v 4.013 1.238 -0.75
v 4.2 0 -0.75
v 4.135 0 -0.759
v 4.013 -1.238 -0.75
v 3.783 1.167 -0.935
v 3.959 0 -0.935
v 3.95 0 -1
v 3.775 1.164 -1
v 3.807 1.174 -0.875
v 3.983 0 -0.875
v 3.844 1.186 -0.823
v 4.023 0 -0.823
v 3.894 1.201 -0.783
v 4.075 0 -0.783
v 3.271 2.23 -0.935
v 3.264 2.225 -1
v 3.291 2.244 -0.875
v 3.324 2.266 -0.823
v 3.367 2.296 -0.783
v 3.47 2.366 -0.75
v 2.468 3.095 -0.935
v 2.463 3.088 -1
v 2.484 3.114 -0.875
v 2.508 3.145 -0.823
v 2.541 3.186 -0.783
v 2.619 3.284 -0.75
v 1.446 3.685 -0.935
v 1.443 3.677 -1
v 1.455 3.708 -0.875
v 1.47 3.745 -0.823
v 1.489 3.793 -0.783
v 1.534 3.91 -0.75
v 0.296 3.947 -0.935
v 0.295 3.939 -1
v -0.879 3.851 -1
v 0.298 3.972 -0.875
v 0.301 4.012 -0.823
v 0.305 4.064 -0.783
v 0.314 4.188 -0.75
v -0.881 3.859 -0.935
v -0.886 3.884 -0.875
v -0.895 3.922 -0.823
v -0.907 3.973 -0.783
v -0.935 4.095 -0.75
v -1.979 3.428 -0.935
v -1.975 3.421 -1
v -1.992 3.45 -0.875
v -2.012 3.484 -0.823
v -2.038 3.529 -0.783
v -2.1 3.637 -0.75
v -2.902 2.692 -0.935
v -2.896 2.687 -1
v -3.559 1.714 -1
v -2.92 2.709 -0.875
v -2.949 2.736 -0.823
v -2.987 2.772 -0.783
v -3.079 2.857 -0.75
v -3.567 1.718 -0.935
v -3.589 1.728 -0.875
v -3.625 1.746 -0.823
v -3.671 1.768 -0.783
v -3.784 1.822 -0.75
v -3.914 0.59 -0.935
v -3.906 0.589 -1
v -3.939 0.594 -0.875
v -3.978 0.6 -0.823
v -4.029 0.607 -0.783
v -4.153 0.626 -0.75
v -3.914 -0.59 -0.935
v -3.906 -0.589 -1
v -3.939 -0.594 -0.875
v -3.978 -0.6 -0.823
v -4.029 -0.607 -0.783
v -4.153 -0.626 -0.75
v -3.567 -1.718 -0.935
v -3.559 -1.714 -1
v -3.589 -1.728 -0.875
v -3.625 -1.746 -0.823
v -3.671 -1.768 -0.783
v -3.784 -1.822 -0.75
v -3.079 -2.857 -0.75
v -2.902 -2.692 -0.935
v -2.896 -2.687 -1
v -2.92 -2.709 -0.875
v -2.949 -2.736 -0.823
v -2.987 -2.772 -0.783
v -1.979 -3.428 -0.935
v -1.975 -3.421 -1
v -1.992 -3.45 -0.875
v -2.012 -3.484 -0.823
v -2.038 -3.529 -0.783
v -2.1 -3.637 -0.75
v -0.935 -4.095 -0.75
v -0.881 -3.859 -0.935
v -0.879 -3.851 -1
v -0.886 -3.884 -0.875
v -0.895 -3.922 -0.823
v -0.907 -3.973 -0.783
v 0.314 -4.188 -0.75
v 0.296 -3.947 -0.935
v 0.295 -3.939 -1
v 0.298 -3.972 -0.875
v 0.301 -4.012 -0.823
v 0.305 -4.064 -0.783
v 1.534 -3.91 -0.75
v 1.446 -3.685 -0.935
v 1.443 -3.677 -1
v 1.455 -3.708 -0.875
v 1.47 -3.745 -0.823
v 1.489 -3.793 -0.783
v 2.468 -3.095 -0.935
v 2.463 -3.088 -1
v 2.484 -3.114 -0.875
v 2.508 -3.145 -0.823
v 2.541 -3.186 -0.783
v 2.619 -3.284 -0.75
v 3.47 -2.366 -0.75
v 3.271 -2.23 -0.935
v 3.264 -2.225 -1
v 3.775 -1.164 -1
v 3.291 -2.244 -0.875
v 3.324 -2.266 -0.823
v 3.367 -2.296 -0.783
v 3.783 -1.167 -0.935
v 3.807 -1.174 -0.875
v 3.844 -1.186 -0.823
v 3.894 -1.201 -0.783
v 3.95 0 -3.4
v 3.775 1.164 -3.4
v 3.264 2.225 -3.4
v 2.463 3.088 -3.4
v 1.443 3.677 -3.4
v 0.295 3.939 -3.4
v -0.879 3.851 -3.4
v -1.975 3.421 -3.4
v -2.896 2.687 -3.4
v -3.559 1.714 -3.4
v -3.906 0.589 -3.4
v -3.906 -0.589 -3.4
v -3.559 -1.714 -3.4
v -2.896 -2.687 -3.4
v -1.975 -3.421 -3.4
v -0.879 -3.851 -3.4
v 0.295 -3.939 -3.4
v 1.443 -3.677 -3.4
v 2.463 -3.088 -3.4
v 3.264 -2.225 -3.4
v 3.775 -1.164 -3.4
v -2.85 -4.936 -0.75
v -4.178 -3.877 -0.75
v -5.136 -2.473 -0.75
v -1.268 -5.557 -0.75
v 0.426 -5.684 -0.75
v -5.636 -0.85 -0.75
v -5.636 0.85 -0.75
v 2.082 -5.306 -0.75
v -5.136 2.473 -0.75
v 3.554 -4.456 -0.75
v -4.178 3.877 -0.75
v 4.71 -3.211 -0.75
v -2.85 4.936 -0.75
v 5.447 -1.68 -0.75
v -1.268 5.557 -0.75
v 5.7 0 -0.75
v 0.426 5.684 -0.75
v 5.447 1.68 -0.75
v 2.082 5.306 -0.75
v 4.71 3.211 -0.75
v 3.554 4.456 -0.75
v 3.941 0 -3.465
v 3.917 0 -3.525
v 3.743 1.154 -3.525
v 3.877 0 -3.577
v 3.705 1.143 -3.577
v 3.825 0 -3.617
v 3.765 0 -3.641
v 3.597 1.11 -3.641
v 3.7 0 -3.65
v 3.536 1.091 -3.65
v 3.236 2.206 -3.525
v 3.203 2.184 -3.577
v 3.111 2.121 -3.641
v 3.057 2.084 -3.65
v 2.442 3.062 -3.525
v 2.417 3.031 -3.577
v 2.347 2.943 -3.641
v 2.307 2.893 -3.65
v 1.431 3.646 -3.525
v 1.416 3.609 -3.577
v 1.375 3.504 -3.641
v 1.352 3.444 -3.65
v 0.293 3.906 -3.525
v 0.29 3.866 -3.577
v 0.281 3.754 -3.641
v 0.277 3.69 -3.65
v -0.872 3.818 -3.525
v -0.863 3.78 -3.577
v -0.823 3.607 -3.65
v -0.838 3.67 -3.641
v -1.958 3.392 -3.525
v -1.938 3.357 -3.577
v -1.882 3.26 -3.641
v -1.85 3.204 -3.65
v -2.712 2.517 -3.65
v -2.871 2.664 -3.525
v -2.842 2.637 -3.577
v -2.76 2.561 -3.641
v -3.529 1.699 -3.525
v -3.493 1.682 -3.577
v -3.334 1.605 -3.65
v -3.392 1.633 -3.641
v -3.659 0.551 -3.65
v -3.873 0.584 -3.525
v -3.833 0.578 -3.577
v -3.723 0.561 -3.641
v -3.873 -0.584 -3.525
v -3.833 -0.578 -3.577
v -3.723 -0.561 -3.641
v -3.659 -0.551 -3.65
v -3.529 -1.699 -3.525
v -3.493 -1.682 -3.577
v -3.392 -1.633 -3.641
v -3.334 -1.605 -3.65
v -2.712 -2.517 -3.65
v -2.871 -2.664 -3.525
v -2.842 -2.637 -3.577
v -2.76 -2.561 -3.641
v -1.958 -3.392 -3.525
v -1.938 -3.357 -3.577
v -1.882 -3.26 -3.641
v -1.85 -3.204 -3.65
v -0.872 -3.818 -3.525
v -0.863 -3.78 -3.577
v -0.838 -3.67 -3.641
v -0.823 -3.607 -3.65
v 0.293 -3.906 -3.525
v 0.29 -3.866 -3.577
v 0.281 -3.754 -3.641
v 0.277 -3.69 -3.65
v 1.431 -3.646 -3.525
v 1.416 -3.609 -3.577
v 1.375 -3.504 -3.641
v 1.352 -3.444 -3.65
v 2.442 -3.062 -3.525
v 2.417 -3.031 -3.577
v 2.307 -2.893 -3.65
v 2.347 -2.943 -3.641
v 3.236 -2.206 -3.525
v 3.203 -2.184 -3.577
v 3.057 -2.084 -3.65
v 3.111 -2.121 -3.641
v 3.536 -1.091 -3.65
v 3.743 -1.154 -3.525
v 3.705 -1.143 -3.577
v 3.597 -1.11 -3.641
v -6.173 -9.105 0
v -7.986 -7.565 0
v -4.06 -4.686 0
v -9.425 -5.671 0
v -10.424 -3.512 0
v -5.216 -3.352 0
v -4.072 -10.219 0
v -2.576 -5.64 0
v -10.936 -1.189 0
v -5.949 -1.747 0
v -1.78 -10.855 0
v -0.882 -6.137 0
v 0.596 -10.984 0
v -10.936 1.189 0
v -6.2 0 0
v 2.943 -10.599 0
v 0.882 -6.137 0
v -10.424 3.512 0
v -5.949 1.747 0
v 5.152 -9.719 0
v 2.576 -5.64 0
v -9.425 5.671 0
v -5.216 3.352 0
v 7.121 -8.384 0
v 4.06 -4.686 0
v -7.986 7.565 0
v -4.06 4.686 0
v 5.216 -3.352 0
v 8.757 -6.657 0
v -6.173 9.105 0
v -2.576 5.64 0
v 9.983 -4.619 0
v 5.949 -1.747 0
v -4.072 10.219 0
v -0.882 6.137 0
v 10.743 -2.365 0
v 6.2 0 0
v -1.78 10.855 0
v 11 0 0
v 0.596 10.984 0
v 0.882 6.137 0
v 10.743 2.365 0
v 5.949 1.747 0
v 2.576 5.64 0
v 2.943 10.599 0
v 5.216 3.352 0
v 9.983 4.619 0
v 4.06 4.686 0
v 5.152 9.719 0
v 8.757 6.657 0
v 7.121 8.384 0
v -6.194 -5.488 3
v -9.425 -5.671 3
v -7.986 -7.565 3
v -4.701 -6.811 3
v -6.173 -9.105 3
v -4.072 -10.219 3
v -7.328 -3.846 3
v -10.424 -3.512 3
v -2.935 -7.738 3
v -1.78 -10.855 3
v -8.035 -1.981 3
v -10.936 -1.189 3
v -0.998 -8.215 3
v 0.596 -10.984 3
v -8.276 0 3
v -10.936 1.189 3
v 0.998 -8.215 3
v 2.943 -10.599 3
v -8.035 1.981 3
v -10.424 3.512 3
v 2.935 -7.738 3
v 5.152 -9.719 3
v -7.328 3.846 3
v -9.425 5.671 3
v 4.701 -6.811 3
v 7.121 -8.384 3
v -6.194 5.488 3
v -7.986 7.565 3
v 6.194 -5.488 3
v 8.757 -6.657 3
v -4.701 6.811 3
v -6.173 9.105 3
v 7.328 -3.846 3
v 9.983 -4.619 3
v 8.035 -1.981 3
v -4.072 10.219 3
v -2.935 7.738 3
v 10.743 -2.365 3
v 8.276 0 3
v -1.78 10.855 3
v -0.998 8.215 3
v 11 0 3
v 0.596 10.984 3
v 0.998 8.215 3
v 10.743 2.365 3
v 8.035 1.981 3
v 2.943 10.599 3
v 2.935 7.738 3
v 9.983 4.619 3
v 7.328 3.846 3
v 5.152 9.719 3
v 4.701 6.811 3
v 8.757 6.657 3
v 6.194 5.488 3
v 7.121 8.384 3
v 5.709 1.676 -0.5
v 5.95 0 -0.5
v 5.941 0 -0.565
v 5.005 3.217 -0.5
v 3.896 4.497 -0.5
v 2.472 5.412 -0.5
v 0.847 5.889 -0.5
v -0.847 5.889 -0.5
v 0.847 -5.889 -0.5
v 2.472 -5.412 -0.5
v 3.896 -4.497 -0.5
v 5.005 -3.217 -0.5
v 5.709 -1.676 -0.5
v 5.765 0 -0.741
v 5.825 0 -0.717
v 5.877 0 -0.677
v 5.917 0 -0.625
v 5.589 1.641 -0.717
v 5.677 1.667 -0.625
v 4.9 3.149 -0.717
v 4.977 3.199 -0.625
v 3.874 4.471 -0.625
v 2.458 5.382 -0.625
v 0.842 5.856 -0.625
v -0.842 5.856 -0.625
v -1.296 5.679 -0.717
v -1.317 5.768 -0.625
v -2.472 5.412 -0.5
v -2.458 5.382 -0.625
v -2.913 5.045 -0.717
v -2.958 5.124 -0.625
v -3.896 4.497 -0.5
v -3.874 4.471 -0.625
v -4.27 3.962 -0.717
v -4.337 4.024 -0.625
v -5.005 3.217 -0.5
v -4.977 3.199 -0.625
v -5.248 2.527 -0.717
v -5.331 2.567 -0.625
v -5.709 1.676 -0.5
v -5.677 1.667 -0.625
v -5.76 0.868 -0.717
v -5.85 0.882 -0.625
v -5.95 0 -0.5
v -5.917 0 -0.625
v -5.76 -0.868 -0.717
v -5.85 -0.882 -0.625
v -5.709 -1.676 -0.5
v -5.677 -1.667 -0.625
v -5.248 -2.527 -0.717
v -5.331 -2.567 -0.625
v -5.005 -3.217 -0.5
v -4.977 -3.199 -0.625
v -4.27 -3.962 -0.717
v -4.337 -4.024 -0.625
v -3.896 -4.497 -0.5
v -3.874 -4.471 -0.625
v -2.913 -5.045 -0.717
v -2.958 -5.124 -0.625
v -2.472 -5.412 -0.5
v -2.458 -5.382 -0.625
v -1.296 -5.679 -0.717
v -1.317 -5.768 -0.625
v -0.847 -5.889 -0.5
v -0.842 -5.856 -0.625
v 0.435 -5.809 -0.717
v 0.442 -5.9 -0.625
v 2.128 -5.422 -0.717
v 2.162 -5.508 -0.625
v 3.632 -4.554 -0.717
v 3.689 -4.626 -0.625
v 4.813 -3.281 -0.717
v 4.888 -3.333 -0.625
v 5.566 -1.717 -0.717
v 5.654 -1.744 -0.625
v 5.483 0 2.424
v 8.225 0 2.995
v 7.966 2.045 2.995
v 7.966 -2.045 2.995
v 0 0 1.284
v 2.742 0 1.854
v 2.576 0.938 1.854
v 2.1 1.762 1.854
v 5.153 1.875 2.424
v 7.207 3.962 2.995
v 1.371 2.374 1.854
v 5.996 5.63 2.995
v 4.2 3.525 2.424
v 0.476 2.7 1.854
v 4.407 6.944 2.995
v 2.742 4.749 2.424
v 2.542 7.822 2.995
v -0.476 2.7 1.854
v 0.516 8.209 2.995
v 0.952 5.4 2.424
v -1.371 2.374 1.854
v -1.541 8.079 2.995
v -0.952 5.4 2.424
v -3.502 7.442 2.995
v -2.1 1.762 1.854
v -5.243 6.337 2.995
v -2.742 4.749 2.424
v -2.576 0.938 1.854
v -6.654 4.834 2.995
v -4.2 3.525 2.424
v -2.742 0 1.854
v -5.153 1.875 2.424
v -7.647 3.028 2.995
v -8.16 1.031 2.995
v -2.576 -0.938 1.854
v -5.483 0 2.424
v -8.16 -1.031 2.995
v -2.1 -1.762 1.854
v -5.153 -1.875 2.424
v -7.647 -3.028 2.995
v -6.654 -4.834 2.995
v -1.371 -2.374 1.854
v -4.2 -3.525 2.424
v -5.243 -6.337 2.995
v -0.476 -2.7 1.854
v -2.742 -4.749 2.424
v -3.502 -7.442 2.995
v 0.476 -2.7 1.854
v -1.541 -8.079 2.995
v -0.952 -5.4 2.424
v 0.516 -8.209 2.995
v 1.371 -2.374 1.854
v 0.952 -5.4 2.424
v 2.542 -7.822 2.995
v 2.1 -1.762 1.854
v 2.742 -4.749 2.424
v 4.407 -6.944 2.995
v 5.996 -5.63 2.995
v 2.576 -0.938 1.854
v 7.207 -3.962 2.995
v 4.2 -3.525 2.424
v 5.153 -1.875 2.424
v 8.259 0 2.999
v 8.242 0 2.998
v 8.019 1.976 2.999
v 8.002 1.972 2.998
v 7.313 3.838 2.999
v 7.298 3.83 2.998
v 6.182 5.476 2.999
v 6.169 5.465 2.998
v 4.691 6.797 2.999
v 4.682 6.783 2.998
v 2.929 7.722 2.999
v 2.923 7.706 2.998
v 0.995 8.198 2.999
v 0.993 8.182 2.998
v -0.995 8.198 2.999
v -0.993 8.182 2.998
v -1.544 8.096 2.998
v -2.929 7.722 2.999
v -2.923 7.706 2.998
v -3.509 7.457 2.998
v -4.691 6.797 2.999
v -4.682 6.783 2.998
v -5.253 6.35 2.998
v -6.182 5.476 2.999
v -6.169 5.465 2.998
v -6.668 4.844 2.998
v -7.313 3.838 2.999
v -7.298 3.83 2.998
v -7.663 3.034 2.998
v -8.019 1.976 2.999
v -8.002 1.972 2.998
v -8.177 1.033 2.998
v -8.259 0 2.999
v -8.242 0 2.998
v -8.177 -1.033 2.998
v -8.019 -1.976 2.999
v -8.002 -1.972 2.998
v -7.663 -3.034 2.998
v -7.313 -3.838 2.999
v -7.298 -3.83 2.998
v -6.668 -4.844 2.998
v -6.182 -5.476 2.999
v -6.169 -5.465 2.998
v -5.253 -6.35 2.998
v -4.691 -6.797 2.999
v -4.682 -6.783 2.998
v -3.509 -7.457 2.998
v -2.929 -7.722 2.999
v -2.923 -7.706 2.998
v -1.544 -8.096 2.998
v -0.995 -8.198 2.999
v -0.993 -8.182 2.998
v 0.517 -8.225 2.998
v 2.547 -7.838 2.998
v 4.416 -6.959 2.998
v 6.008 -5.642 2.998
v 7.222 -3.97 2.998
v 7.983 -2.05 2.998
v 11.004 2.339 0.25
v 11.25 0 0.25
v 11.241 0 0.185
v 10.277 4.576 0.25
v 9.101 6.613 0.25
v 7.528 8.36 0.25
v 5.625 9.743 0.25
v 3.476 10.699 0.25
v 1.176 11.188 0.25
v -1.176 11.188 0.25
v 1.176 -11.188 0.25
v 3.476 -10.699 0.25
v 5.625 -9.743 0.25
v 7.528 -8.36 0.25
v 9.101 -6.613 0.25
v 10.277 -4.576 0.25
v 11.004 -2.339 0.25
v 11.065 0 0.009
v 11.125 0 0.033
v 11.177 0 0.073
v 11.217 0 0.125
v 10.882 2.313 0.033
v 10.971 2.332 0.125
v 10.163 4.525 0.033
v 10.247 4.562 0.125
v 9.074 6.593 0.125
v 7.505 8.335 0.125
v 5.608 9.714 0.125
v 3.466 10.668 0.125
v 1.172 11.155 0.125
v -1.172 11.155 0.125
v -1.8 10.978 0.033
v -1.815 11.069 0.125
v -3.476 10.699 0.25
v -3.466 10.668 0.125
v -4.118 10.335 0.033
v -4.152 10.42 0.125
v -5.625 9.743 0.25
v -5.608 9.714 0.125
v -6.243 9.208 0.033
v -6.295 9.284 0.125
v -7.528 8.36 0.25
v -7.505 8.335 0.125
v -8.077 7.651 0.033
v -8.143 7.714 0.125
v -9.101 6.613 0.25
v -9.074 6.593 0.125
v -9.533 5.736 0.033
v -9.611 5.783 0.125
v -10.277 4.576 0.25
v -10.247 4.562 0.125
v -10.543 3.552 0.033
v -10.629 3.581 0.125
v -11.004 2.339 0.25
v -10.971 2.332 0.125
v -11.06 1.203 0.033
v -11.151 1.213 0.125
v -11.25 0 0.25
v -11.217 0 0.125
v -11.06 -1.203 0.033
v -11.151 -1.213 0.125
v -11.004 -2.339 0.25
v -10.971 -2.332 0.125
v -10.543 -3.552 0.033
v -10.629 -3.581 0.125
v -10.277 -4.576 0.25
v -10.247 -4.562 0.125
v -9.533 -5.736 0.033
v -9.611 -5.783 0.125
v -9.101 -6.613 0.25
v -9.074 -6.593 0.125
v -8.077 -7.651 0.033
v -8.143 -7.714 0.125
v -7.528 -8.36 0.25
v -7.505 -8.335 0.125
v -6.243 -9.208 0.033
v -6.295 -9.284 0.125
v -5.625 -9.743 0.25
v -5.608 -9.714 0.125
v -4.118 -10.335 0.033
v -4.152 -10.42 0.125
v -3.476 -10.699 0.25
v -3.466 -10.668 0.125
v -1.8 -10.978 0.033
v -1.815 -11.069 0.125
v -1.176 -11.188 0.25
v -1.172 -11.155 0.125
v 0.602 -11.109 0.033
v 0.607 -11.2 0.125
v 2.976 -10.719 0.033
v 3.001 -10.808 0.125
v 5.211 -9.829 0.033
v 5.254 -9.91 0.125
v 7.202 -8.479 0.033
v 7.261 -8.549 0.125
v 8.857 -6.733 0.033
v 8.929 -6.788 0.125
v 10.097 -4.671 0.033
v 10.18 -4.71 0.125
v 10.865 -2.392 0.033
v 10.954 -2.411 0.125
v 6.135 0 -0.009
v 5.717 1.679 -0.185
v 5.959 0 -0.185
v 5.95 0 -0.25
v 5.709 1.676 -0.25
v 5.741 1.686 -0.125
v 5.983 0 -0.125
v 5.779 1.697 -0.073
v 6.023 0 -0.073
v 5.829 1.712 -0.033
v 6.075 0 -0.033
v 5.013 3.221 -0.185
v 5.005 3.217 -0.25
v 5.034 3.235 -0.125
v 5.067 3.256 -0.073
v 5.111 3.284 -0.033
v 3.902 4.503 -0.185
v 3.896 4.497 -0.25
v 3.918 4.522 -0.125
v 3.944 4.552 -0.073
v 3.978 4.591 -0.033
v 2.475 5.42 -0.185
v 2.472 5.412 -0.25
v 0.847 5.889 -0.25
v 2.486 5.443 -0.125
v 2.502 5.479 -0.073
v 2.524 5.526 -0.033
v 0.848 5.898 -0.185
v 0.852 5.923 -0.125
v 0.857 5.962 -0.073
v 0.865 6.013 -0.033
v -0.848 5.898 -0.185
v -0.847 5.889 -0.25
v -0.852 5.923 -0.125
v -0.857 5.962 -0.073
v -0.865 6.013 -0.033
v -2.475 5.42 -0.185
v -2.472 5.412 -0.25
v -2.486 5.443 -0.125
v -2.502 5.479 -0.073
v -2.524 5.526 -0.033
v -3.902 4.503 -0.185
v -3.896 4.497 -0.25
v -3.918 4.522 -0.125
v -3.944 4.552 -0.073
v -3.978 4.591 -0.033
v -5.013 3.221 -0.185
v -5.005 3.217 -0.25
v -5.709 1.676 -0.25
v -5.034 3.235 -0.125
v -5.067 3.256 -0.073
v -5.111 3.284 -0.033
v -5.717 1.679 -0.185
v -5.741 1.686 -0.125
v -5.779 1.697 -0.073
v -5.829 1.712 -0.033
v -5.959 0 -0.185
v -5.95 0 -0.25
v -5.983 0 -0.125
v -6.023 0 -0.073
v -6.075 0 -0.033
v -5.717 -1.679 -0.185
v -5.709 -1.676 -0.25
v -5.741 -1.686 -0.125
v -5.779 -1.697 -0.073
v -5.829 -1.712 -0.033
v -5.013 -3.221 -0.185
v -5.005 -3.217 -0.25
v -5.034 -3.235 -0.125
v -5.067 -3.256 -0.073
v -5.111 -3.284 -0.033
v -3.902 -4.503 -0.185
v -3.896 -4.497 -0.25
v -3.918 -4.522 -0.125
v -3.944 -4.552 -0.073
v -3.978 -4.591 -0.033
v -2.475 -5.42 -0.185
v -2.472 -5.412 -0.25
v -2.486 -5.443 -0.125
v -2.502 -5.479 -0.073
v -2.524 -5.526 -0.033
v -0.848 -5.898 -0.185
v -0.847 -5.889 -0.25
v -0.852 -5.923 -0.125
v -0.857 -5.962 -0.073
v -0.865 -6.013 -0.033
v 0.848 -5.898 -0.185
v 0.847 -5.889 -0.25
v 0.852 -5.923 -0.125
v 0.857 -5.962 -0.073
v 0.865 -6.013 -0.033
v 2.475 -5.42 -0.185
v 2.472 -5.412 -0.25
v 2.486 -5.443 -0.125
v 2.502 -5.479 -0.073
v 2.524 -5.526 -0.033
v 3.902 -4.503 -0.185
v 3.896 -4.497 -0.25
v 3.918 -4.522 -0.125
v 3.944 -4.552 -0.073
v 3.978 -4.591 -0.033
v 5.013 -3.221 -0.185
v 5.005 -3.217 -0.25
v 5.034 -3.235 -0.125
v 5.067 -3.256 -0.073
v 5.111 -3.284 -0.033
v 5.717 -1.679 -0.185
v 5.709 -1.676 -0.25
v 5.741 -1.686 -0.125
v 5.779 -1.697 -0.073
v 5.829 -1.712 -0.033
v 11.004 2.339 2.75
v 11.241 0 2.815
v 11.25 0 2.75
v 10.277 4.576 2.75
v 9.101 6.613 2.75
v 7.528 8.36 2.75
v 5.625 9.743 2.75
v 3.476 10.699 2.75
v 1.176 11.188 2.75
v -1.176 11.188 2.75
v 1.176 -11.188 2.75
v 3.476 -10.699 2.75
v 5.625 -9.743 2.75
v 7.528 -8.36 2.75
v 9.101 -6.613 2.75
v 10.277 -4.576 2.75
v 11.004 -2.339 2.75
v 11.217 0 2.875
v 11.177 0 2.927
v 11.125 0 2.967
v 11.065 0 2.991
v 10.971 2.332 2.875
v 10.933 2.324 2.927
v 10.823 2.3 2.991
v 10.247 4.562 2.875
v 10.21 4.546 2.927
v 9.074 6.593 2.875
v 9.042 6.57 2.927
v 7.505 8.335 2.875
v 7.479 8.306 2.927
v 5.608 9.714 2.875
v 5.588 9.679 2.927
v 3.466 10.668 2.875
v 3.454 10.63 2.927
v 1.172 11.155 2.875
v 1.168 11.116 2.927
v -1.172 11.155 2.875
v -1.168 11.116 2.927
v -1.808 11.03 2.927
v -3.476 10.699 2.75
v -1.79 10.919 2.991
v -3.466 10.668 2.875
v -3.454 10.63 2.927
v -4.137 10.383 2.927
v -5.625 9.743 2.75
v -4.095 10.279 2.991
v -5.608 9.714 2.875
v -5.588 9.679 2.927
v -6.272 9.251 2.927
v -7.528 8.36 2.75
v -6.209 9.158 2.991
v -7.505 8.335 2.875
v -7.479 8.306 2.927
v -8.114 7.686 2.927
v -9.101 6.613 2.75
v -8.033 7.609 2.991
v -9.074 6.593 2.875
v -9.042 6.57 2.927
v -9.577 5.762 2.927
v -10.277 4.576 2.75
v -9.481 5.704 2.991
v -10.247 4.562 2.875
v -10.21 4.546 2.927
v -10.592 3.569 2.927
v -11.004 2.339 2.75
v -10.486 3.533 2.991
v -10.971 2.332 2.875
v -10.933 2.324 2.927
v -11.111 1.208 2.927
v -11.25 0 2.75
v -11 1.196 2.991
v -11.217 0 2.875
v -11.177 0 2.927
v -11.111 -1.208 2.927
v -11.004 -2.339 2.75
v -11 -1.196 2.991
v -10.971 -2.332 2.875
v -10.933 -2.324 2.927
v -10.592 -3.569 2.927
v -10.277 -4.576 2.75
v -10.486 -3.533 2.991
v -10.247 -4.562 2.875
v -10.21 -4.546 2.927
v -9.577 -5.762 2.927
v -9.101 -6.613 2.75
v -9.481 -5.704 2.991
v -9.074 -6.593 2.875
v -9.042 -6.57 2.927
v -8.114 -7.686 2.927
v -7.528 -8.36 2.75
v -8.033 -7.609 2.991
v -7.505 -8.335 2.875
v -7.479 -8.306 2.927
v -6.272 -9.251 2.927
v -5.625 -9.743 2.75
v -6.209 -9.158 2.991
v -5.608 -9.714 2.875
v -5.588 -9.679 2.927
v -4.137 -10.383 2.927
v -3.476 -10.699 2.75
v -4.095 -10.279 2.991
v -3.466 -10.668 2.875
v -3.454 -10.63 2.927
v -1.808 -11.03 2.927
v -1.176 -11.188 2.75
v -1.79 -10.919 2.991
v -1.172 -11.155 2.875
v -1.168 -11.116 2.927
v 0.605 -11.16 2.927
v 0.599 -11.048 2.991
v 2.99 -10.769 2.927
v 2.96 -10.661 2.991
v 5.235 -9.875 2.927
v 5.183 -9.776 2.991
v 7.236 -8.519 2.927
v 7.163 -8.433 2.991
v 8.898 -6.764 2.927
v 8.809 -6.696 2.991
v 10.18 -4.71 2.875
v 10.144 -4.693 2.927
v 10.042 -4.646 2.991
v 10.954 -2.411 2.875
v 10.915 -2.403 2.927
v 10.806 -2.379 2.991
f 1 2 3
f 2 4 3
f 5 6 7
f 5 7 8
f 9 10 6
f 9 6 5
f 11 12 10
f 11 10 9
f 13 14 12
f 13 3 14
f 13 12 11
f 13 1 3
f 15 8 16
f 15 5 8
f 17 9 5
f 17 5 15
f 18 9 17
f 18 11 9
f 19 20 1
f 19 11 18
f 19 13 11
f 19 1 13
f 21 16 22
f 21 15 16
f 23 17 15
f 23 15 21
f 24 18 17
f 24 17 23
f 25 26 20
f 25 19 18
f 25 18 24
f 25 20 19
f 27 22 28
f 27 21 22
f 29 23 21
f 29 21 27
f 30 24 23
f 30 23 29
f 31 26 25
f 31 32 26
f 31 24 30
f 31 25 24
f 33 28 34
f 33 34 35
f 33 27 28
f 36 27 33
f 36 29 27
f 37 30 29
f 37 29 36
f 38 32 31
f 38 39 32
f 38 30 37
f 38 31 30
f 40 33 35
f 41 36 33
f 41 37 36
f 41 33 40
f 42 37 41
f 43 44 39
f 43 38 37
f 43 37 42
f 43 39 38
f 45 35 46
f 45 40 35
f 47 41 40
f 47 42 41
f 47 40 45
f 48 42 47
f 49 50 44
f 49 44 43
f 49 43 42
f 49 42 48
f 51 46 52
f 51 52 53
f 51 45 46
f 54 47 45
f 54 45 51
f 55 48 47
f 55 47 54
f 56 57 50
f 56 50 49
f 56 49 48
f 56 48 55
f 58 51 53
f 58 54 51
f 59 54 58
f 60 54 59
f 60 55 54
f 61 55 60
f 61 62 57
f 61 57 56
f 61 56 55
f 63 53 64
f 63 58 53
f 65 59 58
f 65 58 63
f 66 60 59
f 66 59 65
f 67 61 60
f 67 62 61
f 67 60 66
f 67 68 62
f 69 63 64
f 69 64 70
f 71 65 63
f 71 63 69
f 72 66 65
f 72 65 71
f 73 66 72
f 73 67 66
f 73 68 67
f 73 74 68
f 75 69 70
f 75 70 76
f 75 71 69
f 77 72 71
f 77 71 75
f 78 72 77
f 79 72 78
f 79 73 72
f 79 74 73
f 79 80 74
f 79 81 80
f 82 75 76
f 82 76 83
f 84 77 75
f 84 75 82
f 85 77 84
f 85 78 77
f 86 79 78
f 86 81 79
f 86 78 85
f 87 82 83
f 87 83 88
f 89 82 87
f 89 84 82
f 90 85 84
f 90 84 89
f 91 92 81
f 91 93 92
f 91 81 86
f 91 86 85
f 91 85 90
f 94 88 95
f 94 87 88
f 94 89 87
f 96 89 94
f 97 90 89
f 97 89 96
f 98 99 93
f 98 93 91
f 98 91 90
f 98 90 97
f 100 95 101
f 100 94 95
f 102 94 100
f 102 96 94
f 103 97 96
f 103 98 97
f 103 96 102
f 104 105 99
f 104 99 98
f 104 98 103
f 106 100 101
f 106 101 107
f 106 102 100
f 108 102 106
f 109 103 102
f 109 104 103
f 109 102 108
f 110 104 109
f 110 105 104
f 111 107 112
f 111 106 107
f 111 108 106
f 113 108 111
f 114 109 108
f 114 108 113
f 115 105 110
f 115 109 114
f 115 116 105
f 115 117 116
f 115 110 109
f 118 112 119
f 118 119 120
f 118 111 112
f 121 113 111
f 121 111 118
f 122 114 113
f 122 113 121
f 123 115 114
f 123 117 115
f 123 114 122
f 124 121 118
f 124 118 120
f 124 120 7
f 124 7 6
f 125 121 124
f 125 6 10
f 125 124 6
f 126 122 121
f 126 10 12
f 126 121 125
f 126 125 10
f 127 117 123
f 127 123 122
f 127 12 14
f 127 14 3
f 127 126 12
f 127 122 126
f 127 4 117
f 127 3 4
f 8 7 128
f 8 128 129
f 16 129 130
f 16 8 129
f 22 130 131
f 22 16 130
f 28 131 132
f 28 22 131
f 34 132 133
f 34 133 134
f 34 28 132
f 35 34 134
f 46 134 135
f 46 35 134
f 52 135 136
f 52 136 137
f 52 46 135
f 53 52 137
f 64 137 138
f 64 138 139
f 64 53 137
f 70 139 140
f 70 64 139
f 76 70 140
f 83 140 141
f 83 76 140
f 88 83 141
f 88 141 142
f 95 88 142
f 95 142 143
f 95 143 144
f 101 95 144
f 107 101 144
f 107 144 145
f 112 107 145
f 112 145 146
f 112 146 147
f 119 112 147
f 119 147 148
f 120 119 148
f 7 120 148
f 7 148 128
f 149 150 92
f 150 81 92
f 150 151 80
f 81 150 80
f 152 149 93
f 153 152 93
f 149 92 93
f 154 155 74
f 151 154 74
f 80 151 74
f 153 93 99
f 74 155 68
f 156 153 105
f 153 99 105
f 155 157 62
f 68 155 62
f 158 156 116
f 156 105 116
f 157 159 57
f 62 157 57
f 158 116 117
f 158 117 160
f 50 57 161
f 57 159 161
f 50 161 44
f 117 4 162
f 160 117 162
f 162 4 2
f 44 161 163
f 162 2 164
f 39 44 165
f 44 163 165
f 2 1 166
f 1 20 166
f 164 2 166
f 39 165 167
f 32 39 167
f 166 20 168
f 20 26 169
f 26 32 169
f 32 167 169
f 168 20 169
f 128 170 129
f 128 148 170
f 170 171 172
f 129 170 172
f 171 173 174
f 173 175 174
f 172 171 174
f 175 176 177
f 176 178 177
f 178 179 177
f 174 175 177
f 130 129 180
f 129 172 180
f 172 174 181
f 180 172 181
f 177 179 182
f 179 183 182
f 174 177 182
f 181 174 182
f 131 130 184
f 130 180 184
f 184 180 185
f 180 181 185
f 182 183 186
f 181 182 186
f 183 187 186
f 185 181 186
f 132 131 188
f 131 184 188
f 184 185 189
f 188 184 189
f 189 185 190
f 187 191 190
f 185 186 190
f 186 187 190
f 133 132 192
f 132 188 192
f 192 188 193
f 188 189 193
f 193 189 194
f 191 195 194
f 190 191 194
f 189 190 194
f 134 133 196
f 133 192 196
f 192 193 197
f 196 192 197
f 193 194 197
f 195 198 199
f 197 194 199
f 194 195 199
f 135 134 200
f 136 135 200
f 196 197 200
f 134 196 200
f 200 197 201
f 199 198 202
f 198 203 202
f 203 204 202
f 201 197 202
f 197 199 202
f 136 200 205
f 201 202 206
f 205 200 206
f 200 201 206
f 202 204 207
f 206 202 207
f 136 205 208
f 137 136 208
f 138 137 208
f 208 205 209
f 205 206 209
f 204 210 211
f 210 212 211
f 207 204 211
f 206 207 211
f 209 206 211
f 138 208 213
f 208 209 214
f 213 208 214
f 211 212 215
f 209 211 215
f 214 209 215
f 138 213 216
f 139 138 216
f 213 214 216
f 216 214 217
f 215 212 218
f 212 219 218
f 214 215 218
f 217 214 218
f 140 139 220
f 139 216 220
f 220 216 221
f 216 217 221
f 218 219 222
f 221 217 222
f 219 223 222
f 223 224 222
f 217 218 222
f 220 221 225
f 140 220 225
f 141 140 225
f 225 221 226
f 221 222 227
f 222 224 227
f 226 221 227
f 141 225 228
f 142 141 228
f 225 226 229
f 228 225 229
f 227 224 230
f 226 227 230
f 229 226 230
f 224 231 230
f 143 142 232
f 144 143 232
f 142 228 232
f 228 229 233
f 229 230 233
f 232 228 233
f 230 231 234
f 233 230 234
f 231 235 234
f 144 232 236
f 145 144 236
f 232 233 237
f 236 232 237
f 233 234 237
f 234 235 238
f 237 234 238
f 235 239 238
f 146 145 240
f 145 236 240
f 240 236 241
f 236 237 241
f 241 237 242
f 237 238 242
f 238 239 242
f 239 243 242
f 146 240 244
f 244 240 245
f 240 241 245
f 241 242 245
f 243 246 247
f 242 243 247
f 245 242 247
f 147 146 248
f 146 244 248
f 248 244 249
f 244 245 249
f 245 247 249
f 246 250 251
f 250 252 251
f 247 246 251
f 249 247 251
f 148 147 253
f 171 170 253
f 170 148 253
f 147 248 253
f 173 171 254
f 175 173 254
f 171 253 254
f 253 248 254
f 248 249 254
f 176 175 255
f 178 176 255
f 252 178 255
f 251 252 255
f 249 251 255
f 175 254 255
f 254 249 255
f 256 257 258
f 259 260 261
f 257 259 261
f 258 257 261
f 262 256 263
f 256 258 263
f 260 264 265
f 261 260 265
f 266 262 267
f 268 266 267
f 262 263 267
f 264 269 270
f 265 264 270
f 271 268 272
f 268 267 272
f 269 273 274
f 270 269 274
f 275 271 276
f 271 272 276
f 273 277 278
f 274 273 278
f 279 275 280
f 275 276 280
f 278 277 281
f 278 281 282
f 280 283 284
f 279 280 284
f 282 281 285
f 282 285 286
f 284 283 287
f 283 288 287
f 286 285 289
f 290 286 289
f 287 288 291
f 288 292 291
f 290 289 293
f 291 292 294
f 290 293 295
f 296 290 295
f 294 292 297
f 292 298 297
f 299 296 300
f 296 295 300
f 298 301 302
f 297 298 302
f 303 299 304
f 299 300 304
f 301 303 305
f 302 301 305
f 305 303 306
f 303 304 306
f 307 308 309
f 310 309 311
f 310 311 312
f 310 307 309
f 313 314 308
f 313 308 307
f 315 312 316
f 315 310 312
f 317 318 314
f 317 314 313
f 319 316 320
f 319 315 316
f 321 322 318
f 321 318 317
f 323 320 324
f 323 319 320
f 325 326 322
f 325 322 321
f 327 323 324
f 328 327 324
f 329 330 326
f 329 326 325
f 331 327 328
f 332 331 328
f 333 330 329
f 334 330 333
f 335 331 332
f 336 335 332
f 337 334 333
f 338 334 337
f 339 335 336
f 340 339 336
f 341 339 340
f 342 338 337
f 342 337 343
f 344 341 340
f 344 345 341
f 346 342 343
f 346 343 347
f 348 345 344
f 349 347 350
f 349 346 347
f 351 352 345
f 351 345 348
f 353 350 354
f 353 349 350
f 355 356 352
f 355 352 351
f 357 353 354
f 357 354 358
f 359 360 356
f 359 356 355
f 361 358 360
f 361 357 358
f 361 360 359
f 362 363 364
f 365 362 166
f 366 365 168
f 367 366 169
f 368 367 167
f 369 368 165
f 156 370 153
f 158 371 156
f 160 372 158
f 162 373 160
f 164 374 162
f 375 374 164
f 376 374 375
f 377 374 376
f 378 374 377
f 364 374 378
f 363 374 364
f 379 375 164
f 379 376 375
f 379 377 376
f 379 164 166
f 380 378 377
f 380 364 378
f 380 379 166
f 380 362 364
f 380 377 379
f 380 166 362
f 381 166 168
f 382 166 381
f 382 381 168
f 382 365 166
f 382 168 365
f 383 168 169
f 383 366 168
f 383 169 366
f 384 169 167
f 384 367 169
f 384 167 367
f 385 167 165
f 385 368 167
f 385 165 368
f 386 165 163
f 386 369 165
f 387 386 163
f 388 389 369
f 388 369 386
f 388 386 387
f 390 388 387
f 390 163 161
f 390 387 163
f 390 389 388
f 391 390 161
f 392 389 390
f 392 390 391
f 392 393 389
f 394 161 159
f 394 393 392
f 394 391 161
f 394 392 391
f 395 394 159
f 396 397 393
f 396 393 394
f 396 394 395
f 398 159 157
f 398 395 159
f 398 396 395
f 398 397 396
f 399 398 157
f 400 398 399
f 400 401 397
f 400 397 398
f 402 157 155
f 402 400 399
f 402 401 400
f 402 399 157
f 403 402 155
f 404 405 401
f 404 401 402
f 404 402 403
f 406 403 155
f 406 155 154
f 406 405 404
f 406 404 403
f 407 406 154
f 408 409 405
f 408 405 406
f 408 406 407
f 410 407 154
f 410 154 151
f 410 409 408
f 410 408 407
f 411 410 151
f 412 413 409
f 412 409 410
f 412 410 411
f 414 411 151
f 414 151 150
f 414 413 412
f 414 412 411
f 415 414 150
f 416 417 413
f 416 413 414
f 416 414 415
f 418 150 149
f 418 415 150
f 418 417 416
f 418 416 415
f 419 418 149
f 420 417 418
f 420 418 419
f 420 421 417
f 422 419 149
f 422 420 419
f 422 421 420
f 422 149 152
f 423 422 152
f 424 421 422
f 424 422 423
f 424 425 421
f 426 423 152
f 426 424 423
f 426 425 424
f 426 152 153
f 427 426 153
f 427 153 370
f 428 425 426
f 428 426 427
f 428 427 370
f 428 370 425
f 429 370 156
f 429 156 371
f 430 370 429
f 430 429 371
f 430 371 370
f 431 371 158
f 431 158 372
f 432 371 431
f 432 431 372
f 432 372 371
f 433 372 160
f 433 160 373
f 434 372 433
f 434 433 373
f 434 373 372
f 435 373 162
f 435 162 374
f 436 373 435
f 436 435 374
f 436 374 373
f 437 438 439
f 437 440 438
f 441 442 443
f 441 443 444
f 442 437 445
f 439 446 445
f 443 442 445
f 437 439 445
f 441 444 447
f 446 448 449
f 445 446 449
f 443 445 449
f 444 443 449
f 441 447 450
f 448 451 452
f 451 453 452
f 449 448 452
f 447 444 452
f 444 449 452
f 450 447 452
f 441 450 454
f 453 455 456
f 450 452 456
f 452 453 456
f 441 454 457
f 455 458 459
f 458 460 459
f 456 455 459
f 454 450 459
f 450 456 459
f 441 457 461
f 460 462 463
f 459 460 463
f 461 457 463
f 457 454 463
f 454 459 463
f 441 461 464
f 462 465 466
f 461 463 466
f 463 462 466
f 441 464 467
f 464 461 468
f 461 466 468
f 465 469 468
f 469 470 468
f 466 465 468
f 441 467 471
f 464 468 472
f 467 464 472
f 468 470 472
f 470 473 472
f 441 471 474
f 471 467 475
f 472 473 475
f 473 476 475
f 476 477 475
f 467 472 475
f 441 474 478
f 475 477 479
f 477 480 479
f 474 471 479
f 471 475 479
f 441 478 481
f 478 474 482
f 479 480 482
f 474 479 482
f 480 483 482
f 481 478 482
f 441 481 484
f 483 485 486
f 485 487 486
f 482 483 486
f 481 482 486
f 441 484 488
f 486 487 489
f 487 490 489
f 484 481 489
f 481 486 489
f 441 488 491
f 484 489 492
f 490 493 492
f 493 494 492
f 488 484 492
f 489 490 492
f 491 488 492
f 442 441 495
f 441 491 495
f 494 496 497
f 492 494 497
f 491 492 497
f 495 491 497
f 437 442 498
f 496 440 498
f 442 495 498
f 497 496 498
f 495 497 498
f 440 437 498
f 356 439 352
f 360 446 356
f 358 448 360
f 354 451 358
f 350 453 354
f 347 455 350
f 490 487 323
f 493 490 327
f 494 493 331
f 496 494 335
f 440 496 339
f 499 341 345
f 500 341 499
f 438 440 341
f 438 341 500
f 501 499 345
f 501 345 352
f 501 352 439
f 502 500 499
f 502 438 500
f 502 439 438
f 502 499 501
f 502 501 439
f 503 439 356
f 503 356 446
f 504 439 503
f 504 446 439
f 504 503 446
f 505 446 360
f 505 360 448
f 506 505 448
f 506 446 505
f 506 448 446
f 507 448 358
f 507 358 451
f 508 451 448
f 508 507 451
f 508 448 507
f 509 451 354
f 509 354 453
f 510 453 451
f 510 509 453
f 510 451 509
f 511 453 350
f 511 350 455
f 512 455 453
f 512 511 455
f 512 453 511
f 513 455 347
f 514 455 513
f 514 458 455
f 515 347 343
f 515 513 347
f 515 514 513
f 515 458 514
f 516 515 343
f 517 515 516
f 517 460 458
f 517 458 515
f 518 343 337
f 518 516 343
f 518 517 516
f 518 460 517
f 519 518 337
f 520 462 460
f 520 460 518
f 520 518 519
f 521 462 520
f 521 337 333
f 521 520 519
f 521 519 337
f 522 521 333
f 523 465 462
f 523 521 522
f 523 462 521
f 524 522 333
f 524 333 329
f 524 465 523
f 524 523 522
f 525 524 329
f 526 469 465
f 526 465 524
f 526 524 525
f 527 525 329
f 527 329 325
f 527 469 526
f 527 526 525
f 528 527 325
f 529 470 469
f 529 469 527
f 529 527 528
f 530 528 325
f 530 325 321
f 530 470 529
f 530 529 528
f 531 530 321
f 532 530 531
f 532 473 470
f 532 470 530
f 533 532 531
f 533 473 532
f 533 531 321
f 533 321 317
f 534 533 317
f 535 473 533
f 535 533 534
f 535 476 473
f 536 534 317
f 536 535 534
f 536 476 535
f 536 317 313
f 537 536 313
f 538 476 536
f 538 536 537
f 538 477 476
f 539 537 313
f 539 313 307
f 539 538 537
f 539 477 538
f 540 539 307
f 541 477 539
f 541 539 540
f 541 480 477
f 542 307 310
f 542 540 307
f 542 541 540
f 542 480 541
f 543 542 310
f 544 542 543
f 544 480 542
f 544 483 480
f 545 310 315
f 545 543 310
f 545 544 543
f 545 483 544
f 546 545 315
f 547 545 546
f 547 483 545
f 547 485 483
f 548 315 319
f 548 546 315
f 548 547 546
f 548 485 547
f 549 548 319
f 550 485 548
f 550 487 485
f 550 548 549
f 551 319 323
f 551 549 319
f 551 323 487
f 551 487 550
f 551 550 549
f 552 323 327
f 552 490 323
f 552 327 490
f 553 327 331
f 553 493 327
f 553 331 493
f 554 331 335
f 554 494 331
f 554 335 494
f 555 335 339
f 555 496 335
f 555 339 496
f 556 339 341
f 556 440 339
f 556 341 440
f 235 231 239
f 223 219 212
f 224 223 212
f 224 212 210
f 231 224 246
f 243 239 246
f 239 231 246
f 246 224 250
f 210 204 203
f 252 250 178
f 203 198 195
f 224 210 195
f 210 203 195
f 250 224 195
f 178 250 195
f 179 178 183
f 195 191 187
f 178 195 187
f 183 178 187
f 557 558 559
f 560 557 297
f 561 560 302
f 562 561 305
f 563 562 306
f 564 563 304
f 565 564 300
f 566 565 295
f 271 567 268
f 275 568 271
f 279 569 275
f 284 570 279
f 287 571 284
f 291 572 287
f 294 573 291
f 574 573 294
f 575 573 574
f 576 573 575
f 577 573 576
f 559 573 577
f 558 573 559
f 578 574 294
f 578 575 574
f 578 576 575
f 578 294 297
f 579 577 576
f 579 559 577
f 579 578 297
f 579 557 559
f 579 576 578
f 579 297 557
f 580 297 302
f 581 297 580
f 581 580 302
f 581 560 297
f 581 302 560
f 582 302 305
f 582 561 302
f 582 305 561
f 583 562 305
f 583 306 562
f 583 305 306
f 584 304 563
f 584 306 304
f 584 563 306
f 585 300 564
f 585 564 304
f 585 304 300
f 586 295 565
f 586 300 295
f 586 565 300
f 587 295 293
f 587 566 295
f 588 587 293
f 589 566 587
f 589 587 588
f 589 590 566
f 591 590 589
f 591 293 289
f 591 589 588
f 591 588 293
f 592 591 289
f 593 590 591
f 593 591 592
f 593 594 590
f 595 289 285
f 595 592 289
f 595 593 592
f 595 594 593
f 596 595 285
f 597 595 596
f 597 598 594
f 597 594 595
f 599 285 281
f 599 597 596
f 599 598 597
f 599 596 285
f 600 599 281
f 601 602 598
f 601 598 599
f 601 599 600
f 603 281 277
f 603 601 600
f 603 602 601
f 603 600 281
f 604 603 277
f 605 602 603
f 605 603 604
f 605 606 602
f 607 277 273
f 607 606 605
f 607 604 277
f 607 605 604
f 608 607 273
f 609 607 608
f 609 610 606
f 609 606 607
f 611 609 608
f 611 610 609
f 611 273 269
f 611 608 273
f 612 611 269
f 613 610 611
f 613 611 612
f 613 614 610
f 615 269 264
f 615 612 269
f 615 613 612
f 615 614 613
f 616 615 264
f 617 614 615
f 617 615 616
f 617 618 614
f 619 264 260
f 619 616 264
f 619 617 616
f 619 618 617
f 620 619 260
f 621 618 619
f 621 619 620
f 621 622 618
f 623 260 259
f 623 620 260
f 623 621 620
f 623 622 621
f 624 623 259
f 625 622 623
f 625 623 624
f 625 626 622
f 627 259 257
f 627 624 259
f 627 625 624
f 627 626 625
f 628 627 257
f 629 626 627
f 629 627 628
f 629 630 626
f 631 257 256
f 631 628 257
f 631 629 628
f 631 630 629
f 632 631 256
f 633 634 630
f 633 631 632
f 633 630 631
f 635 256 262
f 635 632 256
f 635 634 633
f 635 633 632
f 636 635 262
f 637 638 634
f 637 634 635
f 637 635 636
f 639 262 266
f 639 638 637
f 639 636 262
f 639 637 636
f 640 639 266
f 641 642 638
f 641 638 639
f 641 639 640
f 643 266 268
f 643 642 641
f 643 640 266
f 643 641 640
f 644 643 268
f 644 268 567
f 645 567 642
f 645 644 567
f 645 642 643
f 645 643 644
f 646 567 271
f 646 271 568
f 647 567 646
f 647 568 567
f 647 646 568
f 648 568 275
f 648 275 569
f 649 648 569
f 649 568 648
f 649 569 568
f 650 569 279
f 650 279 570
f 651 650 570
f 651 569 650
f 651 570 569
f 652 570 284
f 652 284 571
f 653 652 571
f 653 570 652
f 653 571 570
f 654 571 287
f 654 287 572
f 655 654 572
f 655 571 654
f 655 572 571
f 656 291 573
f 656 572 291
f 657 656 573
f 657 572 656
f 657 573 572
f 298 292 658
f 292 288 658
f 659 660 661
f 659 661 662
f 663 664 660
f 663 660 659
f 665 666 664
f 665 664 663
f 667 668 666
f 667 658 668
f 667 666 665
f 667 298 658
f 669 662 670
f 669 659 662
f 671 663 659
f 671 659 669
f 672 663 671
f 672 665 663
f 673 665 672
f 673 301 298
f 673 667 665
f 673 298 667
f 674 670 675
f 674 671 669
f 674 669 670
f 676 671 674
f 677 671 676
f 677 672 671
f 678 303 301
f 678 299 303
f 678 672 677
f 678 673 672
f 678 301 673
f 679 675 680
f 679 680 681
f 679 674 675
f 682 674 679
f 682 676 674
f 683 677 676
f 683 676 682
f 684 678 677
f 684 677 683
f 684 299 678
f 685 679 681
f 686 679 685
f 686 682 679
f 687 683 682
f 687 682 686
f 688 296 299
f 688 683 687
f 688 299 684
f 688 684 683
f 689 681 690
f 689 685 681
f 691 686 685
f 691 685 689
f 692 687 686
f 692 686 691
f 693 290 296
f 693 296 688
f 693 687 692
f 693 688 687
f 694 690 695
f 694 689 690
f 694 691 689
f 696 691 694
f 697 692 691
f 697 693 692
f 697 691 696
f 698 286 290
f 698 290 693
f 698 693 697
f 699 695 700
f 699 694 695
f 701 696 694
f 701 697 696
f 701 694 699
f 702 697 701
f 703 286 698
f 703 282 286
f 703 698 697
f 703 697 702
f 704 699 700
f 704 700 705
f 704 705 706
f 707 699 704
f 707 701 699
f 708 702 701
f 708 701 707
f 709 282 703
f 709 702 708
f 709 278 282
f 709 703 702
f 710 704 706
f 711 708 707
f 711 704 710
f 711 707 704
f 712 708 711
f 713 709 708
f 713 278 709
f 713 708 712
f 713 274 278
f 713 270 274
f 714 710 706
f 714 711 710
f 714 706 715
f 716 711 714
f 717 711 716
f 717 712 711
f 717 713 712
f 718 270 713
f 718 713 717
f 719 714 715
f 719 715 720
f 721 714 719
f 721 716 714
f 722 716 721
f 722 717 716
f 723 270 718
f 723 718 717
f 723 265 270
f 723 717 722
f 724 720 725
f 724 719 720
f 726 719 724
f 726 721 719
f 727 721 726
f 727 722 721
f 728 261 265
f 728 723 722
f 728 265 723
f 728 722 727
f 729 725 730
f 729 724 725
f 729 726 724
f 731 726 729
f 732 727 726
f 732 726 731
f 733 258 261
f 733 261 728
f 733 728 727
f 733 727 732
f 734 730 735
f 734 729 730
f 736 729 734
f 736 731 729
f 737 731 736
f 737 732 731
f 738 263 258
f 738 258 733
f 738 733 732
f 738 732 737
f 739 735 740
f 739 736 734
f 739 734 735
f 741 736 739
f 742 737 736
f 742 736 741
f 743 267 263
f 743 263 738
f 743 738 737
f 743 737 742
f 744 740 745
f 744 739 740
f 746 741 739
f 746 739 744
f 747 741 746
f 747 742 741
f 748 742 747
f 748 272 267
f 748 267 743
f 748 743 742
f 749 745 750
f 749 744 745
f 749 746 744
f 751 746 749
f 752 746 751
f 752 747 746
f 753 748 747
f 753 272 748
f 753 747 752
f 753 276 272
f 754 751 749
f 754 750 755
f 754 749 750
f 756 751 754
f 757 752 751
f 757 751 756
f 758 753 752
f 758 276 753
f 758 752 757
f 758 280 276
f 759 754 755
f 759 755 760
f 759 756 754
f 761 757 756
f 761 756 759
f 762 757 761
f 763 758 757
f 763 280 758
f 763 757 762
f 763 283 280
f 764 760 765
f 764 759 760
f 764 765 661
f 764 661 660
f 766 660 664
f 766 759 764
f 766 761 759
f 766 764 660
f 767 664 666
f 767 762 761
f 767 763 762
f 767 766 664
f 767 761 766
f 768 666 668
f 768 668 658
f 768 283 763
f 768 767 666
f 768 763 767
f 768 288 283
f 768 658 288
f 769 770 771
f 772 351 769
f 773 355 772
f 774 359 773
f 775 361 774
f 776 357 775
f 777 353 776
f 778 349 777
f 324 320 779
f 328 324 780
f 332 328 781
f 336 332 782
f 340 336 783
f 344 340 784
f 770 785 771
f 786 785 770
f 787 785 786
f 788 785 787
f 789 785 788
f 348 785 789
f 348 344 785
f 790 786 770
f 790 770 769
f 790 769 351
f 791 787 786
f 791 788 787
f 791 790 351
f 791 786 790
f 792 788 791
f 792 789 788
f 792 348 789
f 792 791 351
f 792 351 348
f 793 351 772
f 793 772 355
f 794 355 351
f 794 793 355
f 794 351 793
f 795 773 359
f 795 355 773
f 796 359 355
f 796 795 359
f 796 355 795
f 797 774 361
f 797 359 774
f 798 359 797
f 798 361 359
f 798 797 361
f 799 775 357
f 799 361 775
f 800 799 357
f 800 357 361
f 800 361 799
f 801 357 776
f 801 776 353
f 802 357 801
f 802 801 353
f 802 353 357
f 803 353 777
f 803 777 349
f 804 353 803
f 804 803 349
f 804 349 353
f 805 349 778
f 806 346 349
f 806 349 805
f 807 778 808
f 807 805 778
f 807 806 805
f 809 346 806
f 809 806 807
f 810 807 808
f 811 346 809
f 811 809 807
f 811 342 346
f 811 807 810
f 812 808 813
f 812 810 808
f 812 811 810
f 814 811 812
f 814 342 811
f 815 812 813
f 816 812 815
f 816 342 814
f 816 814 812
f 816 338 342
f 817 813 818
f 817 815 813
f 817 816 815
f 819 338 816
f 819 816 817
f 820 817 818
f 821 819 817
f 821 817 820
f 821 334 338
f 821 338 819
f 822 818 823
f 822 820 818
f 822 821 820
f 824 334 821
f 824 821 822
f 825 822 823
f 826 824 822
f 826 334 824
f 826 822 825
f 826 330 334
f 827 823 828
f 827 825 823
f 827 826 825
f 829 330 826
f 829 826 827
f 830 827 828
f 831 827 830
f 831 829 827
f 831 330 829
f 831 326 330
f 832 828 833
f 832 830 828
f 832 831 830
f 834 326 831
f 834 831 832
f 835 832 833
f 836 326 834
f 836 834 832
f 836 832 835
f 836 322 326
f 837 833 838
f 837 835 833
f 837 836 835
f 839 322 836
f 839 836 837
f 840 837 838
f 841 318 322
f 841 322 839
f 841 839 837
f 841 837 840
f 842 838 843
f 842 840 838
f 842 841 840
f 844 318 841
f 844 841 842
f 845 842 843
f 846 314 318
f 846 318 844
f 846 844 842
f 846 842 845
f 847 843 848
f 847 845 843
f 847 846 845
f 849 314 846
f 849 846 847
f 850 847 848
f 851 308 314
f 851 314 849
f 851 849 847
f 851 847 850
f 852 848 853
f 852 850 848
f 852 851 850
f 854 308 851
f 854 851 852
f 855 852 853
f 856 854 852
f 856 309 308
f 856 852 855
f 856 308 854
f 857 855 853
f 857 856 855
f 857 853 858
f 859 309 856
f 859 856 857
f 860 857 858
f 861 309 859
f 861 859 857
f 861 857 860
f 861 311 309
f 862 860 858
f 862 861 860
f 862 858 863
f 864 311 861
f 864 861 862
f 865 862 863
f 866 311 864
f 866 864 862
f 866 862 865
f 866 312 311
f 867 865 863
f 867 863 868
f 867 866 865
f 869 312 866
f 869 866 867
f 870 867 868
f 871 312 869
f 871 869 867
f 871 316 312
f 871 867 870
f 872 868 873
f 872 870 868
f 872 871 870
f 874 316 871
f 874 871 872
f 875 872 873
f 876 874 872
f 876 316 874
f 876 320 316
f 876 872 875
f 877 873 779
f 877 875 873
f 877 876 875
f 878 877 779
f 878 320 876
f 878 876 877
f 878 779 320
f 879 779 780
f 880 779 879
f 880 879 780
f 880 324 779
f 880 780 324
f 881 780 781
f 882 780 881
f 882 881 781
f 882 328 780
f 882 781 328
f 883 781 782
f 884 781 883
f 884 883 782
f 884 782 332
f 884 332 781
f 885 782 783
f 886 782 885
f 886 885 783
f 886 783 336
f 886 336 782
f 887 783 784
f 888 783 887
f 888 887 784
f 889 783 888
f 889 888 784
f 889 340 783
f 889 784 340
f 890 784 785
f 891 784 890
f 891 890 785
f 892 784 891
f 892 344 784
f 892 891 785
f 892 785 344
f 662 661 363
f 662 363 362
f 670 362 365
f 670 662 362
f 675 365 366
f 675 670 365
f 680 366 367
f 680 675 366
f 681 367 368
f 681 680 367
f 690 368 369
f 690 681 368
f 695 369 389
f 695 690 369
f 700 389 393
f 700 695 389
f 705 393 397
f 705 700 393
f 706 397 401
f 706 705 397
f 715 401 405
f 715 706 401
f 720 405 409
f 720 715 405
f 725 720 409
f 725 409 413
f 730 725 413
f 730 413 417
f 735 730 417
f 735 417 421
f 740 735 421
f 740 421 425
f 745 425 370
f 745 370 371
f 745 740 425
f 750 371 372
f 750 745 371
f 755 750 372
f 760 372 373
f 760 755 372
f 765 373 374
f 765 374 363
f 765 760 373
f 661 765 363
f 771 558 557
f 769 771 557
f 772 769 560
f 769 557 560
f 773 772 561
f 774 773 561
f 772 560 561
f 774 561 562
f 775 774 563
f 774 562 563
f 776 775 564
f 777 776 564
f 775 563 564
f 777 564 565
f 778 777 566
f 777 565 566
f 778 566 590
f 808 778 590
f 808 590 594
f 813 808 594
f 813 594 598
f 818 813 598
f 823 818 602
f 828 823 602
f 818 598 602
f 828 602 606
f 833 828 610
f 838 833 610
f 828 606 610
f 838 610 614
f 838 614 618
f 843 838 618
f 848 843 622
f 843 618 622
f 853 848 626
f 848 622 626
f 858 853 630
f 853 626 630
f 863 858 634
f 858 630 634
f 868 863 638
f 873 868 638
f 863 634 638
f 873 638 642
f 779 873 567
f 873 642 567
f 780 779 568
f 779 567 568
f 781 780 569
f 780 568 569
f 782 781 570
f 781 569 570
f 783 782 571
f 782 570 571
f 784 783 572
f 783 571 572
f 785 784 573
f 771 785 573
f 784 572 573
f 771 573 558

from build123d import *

# Parameters (mm, degrees)
F0_R     = 11.25
F0_R_2   = 8.25
F0_R_3   = 5.95
F0_R_4   = 3.95
F1_DEPTH = 3
F2_DEPTH = 0.75
F3_DEPTH = 3.65
F6_R     = 0.25


with BuildPart() as f1:
    # F0 (on Top) → F1 (new body)
    with BuildSketch(Plane.XY):
        Circle(F0_R)
        Circle(F0_R_2, mode=Mode.SUBTRACT)
        Circle(F0_R_2)
        Circle(F0_R_3, mode=Mode.SUBTRACT)
        Circle(F0_R_3)
        Circle(F0_R_4, mode=Mode.SUBTRACT)
        Circle(F0_R_4)
    extrude(amount=F1_DEPTH)

    # F0 (on Top) → F2 (join)
    with BuildSketch(Plane.XY):
        Circle(F0_R_3)
        Circle(F0_R_4, mode=Mode.SUBTRACT)
        Circle(F0_R_4)
    extrude(amount=-F2_DEPTH)

    # F0 (on Top) → F3 (join)
    with BuildSketch(Plane.XY):
        Circle(F0_R_4)
    extrude(amount=-F3_DEPTH)

    # F4 (on Front) → F5 (revolve, cut)
    with BuildSketch(Plane.XZ):
        Polygon((0, 3), (0, 1.283717), (8.25, 3), align=None)
    revolve(axis=Axis((0, 0, 2.141858), (0, 0, 1)), mode=Mode.SUBTRACT)

    # F6
    f6_edges = [f1.edges().sort_by_distance(p)[0] for p in [
        (-8.25, 0, 3),
        (-11.25, 0, 3),
        (-11.25, 0, 0),
        (-3.95, 0, -3.65),
        (-3.95, 0, -0.75),
        (-5.95, 0, -0.75),
        (5.95, 0, -0.375),
        (-5.95, 0, 0),
    ]]
    fillet(f6_edges, radius=F6_R)


solid = f1.part
